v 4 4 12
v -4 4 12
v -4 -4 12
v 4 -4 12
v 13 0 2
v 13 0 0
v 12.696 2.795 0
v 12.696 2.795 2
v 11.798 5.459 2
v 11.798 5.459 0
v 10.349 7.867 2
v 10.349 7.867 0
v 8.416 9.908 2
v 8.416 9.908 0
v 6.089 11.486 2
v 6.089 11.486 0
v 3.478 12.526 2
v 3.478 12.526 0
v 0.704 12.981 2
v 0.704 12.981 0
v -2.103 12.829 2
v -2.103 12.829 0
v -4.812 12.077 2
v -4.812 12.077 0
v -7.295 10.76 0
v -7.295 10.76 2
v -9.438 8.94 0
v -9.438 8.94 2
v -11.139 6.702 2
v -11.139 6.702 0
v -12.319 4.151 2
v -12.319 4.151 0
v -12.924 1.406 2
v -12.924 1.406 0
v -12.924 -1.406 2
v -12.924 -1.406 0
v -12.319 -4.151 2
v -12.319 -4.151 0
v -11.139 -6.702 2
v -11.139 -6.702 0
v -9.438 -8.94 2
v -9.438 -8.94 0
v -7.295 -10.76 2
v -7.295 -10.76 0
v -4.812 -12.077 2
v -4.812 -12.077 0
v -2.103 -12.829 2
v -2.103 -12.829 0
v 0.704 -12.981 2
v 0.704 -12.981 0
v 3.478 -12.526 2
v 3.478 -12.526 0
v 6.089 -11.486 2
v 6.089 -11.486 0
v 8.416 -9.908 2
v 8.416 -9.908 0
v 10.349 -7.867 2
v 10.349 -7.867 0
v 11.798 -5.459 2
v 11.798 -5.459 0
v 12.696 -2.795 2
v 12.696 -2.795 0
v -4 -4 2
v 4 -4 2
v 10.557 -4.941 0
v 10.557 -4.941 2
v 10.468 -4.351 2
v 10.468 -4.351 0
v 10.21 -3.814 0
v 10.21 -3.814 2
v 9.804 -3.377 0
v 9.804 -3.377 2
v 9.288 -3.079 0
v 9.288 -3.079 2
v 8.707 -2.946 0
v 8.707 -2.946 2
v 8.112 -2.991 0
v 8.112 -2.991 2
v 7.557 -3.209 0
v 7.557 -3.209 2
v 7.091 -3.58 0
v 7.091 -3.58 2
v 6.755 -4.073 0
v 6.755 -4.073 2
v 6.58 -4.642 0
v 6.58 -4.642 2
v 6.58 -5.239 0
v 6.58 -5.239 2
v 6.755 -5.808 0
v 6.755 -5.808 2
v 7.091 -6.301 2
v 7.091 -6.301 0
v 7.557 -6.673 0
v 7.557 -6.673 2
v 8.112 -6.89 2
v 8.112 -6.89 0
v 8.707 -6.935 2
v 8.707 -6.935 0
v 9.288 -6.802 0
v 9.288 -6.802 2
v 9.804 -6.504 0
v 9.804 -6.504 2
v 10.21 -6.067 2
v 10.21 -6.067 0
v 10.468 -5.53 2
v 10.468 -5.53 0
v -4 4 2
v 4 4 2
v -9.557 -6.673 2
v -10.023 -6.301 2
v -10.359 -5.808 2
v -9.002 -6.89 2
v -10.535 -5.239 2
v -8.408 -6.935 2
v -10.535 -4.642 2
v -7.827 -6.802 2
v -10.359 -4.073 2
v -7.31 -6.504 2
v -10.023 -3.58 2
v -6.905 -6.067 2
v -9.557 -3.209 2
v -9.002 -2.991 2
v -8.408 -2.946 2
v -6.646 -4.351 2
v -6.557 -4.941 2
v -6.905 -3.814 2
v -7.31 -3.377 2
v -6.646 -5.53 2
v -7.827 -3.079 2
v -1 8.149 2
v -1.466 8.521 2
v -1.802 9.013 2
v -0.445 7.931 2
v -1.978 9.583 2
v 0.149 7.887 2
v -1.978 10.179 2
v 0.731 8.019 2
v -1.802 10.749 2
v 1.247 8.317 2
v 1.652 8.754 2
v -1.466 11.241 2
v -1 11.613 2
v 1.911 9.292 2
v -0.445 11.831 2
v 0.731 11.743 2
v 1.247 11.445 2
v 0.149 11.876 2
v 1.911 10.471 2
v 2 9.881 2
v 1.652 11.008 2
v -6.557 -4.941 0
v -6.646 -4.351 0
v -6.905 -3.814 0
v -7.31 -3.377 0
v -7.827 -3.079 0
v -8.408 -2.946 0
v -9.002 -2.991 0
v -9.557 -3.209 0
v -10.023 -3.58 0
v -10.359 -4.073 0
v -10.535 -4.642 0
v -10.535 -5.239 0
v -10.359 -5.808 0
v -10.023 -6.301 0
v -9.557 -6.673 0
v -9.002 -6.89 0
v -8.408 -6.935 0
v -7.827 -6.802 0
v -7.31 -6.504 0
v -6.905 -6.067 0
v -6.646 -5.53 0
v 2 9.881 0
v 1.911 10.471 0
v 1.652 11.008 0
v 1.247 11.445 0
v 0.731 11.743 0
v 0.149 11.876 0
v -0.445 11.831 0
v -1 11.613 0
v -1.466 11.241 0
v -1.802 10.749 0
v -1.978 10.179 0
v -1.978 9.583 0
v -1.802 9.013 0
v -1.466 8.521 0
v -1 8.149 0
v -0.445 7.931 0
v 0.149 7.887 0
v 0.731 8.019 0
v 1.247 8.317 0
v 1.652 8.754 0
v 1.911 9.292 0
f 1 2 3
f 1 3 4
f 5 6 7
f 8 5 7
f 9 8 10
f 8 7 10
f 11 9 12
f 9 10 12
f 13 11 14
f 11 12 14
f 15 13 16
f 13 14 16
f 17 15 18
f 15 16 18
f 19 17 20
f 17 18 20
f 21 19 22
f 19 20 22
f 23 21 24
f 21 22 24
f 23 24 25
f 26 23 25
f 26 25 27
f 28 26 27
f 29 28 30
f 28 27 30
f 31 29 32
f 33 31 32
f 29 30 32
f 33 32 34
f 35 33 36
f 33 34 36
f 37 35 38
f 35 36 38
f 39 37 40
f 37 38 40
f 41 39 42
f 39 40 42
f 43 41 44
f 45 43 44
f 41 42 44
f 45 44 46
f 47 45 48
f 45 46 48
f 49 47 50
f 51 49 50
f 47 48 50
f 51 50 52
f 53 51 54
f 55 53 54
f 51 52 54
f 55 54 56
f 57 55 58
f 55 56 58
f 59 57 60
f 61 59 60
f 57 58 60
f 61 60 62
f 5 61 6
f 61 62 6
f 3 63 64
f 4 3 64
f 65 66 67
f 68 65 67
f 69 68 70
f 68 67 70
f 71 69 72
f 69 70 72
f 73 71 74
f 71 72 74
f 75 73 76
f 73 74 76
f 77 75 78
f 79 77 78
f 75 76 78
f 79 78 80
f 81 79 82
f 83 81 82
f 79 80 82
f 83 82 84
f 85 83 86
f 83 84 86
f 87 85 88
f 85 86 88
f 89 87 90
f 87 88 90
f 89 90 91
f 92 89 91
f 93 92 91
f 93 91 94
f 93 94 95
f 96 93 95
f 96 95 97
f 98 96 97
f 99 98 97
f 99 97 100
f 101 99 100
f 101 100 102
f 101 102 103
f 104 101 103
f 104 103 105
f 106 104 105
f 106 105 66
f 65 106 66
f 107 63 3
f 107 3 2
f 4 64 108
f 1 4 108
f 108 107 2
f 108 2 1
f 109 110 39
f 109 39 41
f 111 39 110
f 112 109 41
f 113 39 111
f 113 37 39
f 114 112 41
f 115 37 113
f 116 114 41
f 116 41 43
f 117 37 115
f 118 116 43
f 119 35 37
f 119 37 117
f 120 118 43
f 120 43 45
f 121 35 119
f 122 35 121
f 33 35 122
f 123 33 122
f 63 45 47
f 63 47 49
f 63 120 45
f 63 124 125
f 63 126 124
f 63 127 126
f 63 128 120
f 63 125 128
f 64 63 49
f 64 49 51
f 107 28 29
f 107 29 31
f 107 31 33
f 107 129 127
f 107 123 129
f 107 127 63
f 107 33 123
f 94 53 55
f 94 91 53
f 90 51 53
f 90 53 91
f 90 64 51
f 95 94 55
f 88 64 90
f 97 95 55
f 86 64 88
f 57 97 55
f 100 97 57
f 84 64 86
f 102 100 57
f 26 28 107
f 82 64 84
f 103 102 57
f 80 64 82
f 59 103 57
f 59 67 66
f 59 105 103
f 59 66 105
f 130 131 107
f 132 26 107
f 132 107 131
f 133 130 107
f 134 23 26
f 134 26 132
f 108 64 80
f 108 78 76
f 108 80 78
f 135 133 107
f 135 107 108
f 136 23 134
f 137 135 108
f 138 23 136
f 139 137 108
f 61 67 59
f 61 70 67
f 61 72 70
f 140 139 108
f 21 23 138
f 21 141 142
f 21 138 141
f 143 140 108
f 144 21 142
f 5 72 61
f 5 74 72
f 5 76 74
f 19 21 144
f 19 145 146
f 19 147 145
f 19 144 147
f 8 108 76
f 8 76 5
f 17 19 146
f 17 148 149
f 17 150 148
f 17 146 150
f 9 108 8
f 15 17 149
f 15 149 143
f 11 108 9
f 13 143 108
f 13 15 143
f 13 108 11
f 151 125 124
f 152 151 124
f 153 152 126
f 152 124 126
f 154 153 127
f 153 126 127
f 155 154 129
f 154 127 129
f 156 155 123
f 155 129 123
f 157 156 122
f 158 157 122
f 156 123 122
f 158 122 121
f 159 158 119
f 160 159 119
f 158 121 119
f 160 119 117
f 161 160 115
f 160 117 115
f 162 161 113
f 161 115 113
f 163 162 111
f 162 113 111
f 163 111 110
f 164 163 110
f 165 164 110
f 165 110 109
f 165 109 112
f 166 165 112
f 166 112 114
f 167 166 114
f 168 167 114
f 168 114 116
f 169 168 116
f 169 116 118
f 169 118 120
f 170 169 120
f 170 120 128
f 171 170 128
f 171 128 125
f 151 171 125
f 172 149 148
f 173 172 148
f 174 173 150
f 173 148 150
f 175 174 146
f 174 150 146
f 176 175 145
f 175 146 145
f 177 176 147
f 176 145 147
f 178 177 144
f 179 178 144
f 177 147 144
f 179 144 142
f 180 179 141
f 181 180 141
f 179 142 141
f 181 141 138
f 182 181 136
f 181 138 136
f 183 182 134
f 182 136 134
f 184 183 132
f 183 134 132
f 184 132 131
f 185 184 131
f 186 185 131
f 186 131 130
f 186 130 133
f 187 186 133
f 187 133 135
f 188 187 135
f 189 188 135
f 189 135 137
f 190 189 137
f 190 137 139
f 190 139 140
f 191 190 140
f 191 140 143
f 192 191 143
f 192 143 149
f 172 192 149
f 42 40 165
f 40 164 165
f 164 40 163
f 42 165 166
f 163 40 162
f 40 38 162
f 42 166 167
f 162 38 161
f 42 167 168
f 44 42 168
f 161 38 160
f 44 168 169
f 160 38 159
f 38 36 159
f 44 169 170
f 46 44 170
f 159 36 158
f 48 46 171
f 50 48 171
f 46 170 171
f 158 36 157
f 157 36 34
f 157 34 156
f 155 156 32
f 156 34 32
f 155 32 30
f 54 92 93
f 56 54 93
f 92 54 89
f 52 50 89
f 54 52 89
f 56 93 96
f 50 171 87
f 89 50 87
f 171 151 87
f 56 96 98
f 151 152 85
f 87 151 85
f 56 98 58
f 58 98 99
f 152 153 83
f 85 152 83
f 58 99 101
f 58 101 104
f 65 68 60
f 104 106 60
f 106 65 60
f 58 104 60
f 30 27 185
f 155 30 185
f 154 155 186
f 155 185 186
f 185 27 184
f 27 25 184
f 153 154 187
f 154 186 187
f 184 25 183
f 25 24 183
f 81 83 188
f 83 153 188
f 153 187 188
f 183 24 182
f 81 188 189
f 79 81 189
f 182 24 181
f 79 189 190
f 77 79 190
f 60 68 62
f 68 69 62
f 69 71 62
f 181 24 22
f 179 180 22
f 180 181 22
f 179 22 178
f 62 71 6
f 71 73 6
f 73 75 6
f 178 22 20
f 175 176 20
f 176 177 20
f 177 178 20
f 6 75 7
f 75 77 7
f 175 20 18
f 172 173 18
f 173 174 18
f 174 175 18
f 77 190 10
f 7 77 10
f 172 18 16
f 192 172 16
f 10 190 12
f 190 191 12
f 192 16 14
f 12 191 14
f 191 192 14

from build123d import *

# Parameters (mm, degrees)
F0_R     = 13
F1_DEPTH = 2
F2_W     = 8
F2_H     = 8
F3_DEPTH = 10
F4_R     = 2
F5_DEPTH = 25


with BuildPart() as f1:
    # F0 (on Top) → F1 (new body)
    with BuildSketch(Plane.XY):
        Circle(F0_R)
    extrude(amount=F1_DEPTH)

    # F2 (on face) → F3 (join)
    with BuildSketch(Plane.XY.offset(2)):
        Rectangle(F2_W, F2_H)
    extrude(amount=F3_DEPTH)

    # F4 (on face) → F5 (cut)
    with BuildSketch(Plane.XY.offset(2)):
        with Locations((0, 9.881104)):
            Circle(F4_R)
        with Locations((8.557287, -4.940552)):
            Circle(F4_R)
        with Locations((-8.557287, -4.940552)):
            Circle(F4_R)
    extrude(amount=-F5_DEPTH, mode=Mode.SUBTRACT)


solid = f1.part
